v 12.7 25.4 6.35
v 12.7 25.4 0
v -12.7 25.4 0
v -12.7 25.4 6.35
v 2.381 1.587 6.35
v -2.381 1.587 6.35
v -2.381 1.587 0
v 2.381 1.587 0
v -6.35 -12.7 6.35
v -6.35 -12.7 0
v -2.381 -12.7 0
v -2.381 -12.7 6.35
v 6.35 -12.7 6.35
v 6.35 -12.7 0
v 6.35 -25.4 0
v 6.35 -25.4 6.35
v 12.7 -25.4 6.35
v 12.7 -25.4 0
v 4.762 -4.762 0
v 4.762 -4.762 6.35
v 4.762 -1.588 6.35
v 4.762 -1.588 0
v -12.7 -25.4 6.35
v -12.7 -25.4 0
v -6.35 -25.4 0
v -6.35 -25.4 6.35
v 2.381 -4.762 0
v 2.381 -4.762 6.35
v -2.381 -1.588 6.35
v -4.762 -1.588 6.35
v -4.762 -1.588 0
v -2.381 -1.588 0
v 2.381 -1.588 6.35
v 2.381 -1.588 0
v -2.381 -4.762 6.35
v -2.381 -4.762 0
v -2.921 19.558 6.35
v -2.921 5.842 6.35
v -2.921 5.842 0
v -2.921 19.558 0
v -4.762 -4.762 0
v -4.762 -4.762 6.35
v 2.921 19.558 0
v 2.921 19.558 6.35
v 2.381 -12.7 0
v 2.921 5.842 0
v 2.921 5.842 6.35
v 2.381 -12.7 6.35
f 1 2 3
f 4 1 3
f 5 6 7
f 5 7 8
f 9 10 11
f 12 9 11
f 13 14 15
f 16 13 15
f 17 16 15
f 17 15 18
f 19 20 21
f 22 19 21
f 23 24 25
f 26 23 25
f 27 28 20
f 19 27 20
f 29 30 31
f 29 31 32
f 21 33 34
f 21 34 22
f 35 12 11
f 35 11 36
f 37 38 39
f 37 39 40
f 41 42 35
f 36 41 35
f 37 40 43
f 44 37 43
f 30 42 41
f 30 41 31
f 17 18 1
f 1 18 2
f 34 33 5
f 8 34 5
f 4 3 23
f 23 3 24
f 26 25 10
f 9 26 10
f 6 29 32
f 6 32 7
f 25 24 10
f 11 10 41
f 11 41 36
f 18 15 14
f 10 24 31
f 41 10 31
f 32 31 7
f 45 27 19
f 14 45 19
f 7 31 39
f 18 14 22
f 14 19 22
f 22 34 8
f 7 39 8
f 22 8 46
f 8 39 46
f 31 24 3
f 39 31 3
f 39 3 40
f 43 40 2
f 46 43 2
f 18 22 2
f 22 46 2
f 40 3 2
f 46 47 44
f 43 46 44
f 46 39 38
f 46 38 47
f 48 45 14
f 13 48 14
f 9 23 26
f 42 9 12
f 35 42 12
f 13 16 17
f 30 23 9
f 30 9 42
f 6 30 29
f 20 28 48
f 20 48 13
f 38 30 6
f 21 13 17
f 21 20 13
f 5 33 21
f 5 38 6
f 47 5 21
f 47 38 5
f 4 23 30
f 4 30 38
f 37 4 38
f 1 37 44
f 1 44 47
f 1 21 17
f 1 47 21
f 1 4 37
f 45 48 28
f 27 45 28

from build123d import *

# Parameters (mm, degrees)
BOSS_EXTRUDE1_DEPTH = 6.35
SKETCH8_W           = 4.7625
SKETCH8_H           = 14.2875
SKETCH8_W_2         = 9.525
SKETCH8_H_2         = 3.175
CUT_EXTRUDE5_DEPTH  = 6.35
SKETCH9_W           = 5.842
SKETCH9_H           = 13.716
CUT_EXTRUDE6_DEPTH  = 6.35


with BuildPart() as part:
    # Sketch7 → Boss-Extrude1 (new body)
    with BuildSketch(Plane.XY):
        Polygon((6.35, -25.4), (12.7, -25.4), (12.7, 25.4), (-12.7, 25.4), (-12.7, -25.4), (-6.35, -25.4), (-6.35, -12.7), (6.35, -12.7), align=None)
    extrude(amount=BOSS_EXTRUDE1_DEPTH)

    # Sketch8 → Cut-Extrude5 (cut)
    with BuildSketch(Plane.XY.offset(6.35)):
        with Locations((0, -5.55625)):
            Rectangle(SKETCH8_W, SKETCH8_H)
        with Locations((0, -3.175)):
            Rectangle(SKETCH8_W_2, SKETCH8_H_2)
    extrude(amount=-CUT_EXTRUDE5_DEPTH, mode=Mode.SUBTRACT)

    # Sketch9 → Cut-Extrude6 (cut)
    with BuildSketch(Plane.XY.offset(6.35)):
        with Locations((0, 12.7)):
            Rectangle(SKETCH9_W, SKETCH9_H)
    extrude(amount=-CUT_EXTRUDE6_DEPTH, mode=Mode.SUBTRACT)


solid = part.part
